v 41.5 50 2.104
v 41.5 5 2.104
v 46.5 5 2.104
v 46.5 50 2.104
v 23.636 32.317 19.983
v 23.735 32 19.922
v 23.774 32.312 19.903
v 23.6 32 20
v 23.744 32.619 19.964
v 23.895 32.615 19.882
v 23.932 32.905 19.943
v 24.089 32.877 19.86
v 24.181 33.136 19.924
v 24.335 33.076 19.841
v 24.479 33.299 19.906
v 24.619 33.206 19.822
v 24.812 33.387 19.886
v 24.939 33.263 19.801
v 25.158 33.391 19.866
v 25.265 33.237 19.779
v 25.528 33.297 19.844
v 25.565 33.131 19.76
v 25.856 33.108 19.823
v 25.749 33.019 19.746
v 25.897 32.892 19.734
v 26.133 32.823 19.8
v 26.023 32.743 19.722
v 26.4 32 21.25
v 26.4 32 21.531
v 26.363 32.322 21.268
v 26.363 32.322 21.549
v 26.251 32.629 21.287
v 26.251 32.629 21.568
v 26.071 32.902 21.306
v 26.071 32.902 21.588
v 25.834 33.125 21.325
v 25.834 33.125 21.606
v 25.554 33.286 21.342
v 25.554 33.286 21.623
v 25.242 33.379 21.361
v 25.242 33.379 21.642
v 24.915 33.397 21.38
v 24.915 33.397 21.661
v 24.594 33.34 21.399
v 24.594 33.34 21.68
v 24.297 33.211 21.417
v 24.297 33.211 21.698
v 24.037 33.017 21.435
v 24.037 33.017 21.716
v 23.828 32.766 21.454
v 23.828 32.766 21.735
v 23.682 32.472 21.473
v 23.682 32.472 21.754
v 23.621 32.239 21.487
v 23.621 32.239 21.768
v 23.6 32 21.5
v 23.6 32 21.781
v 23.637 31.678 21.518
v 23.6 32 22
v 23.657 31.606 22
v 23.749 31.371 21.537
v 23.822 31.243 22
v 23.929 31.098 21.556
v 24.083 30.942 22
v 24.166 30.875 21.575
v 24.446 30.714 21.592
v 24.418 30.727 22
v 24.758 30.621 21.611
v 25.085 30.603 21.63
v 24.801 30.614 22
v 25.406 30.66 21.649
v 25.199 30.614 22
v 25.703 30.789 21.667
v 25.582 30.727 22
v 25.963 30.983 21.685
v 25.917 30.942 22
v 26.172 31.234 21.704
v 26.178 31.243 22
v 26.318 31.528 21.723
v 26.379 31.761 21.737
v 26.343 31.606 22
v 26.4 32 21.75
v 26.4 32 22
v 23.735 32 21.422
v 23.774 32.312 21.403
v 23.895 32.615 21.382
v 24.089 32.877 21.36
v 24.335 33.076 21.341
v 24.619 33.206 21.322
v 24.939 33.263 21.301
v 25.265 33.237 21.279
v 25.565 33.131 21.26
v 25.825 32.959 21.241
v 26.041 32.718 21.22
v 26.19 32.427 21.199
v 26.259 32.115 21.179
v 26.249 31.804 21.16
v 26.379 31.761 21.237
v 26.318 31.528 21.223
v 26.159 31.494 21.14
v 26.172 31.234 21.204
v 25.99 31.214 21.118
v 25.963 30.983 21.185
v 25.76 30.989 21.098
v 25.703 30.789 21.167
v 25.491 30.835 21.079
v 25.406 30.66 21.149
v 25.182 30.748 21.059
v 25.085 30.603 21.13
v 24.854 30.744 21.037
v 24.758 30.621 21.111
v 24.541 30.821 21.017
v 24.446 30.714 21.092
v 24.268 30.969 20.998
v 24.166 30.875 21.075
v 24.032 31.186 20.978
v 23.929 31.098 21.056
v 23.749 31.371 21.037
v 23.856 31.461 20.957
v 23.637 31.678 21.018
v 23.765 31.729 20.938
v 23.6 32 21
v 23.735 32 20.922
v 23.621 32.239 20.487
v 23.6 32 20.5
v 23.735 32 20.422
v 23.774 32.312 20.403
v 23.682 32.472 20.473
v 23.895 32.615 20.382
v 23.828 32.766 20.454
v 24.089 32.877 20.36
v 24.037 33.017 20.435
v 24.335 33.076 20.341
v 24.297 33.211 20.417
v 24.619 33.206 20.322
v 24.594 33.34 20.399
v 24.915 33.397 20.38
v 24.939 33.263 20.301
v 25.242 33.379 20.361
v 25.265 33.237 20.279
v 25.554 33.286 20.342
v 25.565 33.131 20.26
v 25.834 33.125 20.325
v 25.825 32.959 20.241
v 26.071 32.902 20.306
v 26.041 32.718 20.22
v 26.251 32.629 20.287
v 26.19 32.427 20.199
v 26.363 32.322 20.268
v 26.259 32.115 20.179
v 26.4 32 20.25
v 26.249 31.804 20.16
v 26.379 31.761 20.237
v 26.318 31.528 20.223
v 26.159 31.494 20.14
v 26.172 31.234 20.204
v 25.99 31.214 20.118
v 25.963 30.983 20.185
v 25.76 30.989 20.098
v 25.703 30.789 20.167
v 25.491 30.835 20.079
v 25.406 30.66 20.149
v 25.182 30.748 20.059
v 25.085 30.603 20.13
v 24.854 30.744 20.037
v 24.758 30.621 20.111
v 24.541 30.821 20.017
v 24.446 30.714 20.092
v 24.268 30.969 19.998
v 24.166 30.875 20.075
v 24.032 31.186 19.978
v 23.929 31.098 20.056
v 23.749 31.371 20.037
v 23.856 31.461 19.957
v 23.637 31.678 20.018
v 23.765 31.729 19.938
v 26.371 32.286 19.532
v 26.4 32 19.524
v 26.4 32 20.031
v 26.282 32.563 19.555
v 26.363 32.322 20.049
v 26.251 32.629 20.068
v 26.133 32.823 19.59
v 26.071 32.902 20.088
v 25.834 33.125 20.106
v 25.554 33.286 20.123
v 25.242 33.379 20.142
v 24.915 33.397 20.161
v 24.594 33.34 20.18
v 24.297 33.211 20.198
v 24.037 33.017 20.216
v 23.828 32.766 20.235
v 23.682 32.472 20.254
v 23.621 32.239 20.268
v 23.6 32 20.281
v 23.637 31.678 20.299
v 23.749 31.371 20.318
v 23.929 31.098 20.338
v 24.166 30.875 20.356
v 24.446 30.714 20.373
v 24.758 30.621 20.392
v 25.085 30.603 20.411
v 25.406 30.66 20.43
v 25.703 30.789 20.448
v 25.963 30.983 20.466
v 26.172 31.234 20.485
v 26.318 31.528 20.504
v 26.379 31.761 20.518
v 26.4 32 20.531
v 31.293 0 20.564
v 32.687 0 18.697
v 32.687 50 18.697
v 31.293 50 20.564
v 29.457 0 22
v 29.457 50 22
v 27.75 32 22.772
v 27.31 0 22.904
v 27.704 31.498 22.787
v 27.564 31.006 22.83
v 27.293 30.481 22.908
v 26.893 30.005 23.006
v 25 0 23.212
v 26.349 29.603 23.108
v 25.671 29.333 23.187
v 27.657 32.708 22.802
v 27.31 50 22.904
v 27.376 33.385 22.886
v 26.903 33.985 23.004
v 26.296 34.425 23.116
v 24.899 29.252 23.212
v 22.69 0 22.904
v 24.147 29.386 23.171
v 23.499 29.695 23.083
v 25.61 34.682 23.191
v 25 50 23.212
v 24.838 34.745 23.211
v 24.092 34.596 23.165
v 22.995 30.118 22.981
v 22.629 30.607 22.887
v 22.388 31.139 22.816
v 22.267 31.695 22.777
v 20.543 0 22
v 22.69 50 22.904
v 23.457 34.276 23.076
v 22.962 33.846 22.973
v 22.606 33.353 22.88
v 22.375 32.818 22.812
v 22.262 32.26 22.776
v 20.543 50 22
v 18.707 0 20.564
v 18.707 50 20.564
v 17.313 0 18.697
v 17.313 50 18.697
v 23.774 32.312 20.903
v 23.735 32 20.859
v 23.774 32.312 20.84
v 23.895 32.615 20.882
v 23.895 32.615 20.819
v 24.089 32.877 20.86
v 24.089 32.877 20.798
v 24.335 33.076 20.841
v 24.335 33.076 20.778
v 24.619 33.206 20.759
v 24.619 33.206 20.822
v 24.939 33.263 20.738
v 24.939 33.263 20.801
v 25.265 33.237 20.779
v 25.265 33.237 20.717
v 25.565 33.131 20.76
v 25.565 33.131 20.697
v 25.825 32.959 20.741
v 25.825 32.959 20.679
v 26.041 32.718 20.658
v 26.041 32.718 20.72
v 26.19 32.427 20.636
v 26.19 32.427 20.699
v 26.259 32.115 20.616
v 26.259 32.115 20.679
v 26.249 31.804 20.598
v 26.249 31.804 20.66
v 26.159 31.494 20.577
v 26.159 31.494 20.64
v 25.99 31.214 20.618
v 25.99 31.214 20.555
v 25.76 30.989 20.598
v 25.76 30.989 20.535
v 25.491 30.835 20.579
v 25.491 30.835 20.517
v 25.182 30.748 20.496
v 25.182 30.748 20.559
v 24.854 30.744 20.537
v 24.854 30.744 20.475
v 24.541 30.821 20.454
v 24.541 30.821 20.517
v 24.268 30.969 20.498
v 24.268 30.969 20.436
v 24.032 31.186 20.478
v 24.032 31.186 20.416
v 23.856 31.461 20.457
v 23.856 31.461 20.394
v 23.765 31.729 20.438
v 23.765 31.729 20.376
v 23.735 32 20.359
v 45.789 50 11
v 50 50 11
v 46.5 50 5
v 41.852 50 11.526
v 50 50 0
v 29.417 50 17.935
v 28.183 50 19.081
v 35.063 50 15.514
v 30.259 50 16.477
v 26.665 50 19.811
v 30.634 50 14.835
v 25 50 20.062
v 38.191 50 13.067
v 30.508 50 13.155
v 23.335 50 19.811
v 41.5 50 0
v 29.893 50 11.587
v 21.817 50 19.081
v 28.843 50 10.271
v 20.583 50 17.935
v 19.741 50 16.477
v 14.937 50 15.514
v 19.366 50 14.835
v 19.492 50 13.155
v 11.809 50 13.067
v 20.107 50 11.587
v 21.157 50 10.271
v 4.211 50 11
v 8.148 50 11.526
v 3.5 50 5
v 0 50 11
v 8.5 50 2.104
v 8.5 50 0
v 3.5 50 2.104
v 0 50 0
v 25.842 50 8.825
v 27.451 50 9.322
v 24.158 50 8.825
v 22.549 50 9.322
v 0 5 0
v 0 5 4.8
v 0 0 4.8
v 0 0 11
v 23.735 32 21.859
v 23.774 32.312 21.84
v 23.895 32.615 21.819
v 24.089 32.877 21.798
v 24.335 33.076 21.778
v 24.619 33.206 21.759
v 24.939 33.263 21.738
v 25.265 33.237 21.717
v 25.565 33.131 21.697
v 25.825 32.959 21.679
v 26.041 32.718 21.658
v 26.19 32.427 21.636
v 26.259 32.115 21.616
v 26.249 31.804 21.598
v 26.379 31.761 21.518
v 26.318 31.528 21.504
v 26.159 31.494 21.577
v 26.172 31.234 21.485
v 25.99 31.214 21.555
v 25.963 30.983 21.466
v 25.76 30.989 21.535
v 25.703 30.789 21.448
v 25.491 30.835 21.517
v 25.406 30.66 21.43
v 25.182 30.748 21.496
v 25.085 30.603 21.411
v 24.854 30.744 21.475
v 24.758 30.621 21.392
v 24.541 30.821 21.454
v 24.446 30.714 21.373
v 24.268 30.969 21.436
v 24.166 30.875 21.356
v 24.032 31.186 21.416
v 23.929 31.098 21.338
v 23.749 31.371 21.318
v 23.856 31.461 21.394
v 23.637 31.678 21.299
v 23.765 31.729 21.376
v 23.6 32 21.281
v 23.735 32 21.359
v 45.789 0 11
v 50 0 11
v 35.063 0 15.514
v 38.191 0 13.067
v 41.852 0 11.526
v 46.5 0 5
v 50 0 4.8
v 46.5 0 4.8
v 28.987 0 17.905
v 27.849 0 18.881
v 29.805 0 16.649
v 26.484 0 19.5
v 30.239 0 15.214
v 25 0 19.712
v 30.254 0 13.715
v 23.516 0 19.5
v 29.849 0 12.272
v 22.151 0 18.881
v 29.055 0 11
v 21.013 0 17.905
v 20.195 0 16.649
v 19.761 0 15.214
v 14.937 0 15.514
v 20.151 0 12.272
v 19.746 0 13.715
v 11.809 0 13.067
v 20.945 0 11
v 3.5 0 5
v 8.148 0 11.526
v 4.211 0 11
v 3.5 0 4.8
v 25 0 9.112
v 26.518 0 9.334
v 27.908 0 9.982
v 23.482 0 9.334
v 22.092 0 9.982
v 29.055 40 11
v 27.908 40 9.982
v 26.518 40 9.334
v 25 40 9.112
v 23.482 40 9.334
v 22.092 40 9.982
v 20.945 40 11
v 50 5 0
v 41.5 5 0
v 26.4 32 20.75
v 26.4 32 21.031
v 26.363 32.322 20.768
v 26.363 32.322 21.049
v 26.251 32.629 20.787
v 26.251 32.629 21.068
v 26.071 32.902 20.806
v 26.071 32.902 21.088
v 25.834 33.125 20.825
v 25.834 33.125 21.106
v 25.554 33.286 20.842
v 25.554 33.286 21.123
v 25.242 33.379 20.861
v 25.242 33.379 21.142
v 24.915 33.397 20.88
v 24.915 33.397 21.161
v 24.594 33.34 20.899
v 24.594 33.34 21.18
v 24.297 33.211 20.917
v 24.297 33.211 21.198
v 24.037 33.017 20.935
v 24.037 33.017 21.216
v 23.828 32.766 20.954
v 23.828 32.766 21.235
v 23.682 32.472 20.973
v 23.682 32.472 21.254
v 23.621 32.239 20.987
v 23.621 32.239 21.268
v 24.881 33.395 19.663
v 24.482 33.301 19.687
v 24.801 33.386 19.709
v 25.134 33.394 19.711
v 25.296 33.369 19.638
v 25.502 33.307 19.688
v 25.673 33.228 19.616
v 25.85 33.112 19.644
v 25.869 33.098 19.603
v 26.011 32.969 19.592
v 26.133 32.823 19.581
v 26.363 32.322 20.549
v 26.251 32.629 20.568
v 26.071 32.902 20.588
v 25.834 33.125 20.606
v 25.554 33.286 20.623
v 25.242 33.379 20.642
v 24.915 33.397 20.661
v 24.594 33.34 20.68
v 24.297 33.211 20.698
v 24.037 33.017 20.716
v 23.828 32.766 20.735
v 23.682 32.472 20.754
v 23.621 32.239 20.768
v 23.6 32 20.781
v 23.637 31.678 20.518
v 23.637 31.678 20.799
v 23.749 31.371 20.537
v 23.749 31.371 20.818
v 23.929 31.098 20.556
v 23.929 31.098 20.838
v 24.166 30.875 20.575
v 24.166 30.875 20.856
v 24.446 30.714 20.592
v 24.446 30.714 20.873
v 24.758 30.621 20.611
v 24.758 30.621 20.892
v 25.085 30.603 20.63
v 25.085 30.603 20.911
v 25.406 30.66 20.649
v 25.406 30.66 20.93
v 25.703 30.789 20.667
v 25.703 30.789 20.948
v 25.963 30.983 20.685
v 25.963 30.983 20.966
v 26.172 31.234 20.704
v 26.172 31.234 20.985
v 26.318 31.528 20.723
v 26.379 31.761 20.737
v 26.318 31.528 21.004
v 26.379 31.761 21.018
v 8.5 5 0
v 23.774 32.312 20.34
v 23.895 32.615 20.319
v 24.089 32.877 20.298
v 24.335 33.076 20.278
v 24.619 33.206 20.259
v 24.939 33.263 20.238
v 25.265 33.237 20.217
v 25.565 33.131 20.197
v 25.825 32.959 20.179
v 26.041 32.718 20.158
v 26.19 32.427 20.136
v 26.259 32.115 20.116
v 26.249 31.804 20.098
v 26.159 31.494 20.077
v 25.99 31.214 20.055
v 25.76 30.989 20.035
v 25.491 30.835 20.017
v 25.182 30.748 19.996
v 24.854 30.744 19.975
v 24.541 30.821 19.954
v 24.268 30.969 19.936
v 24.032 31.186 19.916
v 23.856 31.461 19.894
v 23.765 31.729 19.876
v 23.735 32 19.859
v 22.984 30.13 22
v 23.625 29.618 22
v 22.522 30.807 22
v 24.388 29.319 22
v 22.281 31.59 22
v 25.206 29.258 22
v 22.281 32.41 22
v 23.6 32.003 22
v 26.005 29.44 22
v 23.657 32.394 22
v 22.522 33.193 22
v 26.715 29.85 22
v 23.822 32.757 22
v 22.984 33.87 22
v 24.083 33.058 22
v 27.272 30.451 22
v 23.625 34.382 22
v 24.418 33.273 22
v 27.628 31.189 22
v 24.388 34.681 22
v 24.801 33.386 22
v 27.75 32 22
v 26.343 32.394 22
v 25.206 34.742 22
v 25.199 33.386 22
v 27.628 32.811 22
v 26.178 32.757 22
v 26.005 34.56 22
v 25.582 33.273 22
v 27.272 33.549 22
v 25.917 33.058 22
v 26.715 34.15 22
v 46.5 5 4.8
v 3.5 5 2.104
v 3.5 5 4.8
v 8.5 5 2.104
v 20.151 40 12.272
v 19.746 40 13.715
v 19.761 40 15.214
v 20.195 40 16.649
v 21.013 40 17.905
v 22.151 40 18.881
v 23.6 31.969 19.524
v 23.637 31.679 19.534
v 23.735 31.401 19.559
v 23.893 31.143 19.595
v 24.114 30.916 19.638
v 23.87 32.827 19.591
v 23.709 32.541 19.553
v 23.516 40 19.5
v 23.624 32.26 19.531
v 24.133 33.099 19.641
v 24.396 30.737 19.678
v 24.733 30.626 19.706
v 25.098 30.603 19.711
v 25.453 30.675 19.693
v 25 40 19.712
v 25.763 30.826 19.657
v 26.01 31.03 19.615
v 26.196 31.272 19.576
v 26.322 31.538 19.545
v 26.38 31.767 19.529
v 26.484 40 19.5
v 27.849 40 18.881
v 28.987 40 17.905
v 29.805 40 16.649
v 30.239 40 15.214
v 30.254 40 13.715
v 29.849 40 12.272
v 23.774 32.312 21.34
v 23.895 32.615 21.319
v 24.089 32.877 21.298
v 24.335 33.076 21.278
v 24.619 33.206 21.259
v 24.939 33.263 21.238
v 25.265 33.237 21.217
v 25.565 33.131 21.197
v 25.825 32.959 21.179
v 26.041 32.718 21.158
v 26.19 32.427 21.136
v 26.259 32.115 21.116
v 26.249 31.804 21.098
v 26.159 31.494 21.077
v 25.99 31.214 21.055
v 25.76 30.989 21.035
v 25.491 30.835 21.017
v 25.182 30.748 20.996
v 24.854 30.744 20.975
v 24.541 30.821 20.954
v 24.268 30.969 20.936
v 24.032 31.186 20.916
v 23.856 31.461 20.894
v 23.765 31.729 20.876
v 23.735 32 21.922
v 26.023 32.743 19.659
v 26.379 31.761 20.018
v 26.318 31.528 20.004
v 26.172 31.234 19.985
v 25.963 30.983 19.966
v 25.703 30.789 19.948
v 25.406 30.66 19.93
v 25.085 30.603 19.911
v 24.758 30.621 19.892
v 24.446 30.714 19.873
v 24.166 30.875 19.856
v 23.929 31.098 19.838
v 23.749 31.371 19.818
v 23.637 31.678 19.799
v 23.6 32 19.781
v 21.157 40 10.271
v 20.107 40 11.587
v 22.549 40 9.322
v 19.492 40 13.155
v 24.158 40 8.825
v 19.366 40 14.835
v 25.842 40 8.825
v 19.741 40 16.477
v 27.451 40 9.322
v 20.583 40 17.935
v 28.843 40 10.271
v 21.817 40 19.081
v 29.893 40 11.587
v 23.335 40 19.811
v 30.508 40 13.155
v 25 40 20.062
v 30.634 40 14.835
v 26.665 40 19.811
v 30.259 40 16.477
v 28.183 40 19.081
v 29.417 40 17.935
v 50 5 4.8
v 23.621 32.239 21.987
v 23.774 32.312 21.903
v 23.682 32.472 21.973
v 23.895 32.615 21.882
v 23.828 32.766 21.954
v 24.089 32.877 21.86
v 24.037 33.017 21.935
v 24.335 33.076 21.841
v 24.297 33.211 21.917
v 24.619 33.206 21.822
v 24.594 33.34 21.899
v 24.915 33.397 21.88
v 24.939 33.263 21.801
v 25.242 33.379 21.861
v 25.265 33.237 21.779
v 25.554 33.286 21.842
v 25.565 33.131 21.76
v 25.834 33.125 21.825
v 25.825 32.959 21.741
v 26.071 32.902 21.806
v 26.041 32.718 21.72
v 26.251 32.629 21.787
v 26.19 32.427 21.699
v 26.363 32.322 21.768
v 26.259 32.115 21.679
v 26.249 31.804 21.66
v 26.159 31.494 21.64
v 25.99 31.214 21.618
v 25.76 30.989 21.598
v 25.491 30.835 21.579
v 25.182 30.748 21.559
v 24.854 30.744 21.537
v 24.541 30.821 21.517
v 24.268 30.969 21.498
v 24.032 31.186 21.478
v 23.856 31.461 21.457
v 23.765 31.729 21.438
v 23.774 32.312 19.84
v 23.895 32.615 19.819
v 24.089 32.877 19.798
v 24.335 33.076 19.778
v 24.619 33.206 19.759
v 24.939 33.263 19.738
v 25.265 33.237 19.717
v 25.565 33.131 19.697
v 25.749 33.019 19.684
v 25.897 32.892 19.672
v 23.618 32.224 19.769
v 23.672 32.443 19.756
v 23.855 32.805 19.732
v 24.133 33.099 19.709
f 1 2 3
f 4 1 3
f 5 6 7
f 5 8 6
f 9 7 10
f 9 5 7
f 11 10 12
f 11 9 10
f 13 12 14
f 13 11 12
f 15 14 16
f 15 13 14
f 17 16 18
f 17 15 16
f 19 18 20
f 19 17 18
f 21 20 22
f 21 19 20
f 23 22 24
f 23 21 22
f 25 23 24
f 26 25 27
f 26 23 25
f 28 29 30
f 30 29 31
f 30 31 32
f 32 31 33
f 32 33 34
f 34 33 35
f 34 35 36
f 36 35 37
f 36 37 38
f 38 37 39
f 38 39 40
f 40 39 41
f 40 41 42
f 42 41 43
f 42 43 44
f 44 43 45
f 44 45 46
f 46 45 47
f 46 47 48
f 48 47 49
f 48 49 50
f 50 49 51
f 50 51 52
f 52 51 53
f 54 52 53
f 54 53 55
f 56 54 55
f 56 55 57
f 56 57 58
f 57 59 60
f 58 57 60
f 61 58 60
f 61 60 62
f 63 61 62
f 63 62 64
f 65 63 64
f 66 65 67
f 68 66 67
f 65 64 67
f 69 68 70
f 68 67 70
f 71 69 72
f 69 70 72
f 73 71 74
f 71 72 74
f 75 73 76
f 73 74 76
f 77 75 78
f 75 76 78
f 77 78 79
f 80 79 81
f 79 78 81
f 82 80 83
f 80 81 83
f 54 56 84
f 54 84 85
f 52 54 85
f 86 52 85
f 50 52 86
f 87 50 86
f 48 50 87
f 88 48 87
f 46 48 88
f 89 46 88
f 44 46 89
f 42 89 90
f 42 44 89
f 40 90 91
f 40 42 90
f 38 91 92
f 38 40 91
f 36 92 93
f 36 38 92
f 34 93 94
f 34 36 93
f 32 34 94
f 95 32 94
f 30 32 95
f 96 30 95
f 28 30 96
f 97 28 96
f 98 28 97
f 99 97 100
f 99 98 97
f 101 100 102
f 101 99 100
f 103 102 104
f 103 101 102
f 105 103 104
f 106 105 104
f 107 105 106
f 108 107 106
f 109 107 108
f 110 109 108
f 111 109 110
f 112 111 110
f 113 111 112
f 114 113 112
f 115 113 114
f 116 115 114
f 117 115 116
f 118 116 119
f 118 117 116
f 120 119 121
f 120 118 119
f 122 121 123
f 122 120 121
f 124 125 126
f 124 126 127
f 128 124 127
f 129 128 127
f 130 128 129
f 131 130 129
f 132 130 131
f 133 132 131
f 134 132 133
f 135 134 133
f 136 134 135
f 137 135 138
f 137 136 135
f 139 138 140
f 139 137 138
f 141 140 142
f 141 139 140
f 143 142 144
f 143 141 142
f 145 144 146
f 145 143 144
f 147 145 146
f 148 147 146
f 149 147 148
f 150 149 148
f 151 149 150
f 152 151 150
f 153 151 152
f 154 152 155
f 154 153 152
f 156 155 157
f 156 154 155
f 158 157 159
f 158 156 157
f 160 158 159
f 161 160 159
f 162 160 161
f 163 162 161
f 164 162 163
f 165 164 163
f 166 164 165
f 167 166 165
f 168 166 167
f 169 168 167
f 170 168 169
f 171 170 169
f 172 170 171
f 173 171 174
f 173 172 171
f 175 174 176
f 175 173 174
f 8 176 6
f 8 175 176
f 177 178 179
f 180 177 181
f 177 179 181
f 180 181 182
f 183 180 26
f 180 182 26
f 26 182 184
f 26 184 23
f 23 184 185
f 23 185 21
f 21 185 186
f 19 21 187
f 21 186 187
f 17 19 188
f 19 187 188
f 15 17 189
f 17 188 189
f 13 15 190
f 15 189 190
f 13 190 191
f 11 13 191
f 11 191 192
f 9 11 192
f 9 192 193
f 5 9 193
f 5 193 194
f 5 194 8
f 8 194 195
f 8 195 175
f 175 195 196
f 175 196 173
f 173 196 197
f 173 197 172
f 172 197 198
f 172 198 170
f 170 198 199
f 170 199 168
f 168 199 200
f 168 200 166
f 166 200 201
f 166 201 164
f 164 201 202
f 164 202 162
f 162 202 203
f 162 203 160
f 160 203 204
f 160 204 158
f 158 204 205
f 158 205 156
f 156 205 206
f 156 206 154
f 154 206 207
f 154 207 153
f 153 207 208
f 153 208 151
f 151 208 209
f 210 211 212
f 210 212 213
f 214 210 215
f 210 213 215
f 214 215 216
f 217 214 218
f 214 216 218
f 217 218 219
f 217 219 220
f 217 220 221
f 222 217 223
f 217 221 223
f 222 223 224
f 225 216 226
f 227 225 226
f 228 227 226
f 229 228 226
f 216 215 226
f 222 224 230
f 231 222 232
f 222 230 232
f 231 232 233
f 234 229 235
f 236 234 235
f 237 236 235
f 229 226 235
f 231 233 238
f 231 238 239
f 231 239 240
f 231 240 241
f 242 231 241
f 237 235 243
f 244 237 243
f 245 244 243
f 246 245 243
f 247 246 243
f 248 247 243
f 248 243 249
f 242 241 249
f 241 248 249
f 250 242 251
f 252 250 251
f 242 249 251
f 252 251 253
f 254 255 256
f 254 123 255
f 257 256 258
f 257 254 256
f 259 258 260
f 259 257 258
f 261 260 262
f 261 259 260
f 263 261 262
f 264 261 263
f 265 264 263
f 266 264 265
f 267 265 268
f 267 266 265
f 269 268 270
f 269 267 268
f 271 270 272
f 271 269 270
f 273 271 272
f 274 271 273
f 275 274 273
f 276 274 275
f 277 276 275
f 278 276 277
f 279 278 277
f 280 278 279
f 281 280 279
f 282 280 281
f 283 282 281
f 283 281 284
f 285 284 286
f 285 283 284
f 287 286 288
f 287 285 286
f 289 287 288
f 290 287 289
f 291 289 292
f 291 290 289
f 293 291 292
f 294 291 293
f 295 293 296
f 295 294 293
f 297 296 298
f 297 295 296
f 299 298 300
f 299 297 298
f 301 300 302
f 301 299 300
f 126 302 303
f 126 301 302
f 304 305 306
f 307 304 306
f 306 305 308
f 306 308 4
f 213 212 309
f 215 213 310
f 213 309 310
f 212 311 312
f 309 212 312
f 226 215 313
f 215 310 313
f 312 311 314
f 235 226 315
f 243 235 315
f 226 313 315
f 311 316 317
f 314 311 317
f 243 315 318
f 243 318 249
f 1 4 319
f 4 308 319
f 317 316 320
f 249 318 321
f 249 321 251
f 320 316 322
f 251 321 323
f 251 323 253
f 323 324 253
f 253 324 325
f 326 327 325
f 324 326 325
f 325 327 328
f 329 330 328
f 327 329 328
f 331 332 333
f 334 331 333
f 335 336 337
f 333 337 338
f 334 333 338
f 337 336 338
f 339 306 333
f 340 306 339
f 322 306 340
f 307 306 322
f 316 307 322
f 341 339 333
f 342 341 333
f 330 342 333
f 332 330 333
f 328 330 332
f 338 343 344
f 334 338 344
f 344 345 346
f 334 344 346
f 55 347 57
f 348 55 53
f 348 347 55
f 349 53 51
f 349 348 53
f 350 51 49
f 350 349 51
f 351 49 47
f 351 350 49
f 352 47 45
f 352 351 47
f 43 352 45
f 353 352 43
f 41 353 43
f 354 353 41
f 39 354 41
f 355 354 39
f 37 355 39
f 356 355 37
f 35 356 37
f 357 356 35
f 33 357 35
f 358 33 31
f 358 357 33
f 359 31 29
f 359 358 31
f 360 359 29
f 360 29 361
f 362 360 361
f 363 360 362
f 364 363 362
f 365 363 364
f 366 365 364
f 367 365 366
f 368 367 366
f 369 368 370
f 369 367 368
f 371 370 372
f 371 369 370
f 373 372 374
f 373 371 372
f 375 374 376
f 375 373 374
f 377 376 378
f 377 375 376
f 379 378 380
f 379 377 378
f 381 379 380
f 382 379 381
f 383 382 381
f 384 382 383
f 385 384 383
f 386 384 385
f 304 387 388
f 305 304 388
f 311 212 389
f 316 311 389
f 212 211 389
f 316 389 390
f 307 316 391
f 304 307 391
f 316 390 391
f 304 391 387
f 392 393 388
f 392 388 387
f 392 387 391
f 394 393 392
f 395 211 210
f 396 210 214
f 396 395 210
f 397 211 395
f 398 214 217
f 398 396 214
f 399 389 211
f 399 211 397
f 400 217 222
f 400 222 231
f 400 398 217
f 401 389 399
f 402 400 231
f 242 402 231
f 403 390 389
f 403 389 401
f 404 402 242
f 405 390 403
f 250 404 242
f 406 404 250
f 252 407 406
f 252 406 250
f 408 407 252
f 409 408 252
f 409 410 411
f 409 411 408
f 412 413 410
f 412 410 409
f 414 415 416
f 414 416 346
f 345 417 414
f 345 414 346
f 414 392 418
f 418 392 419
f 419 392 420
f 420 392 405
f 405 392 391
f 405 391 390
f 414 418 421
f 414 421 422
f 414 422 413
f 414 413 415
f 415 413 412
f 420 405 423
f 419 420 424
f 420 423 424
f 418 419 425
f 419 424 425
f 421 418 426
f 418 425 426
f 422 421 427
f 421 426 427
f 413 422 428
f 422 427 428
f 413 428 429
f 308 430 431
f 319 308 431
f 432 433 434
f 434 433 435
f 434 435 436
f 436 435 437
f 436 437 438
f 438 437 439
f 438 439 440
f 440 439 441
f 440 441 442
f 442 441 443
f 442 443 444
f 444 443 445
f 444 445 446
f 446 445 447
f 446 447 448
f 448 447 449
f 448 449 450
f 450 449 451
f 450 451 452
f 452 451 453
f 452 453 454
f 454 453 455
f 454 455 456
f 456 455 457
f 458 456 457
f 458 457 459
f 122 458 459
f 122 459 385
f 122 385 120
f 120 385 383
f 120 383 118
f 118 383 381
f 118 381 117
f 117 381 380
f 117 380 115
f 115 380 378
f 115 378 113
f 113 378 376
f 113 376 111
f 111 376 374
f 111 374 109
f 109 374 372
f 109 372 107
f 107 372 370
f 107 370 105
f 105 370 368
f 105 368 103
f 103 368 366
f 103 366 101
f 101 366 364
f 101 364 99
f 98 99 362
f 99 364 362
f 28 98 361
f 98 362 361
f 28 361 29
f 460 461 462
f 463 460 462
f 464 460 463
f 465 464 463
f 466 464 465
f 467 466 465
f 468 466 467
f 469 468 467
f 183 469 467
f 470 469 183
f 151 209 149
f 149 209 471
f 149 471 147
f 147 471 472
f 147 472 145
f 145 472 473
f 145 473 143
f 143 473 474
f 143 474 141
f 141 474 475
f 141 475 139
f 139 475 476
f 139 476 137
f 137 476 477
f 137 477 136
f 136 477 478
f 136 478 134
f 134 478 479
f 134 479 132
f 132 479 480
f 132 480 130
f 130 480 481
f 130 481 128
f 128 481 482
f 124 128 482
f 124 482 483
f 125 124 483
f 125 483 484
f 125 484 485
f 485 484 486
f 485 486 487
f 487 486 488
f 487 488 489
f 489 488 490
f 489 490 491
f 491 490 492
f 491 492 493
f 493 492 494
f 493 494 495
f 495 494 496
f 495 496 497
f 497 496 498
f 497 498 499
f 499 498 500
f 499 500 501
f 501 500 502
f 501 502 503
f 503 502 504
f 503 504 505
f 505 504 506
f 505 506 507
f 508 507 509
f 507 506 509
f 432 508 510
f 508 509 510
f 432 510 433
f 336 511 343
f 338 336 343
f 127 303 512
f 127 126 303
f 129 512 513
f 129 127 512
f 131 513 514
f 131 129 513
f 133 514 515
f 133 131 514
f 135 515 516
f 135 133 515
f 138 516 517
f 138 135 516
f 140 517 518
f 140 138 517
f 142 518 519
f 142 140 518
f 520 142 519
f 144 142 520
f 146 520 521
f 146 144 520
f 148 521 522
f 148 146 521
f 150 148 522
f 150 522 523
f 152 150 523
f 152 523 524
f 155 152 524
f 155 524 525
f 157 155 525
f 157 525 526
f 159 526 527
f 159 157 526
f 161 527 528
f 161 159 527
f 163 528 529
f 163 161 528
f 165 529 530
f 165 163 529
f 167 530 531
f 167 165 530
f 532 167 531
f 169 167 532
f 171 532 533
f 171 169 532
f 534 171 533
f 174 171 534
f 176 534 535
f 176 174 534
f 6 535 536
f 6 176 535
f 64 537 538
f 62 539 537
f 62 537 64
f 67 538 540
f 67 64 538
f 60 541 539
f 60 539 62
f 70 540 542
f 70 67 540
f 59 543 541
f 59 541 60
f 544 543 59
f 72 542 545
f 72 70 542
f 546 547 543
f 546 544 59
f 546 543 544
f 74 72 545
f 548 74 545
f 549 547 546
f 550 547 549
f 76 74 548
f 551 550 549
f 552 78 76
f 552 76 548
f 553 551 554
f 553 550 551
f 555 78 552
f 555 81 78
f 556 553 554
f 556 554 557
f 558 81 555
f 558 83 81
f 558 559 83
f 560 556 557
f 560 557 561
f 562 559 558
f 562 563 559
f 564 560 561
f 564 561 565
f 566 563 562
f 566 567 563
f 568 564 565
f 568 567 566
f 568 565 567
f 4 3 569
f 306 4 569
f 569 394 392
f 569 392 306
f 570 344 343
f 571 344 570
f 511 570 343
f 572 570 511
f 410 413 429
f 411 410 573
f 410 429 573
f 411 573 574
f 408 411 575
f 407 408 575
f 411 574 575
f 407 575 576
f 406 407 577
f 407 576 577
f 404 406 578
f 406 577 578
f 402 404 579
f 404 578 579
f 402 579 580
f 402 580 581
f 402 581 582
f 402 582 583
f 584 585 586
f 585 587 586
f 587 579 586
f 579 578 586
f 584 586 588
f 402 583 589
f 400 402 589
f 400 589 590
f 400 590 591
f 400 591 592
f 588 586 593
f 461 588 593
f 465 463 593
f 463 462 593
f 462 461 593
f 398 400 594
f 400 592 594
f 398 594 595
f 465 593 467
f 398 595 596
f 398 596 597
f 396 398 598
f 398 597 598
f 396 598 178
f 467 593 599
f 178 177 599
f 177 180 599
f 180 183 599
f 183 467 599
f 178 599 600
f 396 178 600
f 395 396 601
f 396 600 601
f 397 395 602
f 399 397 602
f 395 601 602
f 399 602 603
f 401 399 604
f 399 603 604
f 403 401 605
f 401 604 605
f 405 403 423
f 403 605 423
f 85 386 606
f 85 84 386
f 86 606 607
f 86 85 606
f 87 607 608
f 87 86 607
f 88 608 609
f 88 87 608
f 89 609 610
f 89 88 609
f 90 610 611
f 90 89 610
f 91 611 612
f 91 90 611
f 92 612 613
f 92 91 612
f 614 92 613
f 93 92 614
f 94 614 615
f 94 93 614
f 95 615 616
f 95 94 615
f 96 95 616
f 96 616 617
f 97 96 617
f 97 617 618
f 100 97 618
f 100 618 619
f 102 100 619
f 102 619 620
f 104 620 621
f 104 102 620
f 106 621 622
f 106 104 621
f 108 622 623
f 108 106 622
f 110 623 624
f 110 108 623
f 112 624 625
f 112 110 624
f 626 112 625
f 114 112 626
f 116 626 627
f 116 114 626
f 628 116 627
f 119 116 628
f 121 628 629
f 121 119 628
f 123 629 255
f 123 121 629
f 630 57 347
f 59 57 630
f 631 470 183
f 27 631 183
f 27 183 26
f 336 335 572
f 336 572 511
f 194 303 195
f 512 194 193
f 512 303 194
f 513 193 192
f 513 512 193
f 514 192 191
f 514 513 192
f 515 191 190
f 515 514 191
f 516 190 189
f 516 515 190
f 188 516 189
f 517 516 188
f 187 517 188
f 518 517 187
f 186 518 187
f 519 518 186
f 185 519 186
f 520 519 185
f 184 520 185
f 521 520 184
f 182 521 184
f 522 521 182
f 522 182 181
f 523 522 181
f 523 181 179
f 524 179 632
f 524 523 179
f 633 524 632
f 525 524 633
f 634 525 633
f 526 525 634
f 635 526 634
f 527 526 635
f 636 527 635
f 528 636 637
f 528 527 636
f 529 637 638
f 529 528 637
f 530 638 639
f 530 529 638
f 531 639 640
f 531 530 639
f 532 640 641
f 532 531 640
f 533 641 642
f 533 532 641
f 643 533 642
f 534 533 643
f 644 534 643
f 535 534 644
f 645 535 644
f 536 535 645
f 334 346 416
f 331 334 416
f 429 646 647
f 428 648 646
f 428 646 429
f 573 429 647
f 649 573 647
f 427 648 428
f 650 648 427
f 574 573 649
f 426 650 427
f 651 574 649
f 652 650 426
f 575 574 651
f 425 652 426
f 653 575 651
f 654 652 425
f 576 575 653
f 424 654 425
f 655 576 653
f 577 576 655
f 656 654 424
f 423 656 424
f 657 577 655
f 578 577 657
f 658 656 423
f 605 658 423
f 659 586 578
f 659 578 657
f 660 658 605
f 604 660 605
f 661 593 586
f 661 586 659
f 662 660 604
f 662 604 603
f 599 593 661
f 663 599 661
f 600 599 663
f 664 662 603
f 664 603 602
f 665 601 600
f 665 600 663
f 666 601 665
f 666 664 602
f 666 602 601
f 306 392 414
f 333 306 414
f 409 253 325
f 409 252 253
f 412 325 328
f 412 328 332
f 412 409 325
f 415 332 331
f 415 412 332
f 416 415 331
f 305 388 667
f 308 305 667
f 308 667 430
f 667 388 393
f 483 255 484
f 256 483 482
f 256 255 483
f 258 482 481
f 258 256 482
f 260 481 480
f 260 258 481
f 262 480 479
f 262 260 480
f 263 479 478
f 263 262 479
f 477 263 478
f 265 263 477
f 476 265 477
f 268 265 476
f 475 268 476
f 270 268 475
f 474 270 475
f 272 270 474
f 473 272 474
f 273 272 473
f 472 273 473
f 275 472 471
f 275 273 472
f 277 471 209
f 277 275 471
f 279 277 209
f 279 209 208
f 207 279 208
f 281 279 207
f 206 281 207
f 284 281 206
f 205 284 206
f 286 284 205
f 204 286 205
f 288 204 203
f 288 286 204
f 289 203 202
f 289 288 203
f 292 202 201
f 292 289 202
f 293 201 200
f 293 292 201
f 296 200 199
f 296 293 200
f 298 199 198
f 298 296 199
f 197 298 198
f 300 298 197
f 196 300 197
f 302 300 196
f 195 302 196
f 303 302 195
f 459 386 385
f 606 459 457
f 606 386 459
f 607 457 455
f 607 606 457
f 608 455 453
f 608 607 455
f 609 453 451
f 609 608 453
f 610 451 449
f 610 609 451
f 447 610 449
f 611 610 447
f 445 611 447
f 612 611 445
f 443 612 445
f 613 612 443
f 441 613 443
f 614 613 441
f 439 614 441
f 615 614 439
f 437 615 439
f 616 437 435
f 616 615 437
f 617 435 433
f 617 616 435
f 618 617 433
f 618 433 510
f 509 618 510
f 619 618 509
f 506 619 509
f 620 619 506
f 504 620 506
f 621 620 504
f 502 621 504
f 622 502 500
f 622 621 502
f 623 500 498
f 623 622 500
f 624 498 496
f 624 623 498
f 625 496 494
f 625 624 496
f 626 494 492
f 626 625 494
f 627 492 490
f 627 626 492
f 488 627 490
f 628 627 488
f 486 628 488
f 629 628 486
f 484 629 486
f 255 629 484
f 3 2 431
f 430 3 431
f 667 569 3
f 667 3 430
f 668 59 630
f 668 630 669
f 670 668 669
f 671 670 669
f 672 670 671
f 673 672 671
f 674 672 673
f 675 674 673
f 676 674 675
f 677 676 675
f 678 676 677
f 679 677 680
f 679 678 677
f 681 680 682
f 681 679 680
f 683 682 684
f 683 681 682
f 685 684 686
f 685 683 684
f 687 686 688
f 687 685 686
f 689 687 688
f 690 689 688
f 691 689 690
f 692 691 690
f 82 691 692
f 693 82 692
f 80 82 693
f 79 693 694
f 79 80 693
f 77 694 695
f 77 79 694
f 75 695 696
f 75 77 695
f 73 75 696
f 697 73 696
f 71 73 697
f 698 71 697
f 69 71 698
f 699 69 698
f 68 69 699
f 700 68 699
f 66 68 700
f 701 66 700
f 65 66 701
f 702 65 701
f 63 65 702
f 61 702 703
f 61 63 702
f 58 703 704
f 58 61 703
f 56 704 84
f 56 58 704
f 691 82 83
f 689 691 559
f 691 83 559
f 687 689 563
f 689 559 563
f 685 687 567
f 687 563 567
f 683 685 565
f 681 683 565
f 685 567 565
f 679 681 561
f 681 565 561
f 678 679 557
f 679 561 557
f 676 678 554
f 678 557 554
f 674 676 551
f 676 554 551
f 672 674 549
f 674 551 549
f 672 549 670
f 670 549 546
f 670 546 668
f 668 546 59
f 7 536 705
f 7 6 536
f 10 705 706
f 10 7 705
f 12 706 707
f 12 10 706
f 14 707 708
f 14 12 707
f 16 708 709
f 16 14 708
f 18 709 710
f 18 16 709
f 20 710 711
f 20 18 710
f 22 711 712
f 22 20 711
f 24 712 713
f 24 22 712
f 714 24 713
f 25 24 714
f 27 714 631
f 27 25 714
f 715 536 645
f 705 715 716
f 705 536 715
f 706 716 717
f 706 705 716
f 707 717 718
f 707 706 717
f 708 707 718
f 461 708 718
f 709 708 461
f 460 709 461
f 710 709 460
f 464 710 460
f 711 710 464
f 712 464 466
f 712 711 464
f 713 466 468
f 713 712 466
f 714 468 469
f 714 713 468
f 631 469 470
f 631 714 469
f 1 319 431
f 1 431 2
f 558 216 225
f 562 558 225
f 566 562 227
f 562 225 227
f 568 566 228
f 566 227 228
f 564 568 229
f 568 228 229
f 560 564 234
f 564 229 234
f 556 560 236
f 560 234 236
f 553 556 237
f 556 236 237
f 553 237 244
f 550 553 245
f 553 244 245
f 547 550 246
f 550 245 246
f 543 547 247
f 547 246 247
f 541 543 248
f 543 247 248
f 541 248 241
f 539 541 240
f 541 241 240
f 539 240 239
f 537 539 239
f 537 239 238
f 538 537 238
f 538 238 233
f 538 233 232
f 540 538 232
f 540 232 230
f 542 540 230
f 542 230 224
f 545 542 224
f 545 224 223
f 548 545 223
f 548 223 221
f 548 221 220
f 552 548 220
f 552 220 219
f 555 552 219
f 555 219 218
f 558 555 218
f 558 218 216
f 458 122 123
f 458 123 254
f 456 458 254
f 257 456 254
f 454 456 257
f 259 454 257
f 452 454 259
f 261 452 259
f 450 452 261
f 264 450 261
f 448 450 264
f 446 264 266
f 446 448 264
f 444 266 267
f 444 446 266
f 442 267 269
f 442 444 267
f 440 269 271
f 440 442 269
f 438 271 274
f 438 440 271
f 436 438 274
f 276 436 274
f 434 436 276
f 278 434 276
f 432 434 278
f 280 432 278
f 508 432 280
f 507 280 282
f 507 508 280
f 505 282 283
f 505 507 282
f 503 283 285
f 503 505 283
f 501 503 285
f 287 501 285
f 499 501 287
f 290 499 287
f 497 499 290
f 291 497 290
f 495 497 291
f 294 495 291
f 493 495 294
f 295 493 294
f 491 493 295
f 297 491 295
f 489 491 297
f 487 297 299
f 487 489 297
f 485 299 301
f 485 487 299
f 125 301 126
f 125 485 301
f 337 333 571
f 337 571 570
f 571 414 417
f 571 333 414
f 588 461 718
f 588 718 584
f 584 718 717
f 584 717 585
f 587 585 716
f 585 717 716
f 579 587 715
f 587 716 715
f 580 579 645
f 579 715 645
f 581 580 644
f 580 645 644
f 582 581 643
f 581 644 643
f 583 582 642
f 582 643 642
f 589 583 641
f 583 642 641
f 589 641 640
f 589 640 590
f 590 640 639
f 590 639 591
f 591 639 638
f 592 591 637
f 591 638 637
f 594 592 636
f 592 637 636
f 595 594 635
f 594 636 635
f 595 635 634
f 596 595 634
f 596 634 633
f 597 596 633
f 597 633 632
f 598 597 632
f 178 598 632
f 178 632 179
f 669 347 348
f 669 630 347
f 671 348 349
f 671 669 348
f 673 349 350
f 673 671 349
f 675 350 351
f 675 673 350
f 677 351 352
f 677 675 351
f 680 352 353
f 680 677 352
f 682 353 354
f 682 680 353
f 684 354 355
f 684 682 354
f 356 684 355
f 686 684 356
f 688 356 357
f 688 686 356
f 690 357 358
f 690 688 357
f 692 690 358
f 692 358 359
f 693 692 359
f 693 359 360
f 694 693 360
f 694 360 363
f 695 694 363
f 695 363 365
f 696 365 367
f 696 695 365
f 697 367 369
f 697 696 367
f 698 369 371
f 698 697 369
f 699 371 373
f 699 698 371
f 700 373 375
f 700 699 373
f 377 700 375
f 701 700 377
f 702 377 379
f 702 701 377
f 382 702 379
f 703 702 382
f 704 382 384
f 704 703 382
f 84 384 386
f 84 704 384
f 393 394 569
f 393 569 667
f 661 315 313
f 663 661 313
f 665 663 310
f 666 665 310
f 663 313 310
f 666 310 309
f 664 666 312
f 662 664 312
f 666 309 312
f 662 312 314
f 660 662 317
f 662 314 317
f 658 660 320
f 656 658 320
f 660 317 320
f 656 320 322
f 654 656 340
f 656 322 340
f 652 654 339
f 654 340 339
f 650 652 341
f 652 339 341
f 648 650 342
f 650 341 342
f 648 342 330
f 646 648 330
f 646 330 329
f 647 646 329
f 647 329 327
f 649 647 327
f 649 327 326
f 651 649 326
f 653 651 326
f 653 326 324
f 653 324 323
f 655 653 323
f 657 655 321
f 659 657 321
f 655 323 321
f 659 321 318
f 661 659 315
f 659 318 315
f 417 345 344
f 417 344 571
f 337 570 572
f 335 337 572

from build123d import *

# Parameters (mm, degrees)
BOSS_EXTRUDE1_DEPTH = 50
SKETCH2_W           = 50
SKETCH2_H           = 4.8
CUT_EXTRUDE1_DEPTH  = 5
SKETCH3_R           = 5.3
CUT_EXTRUDE2_DEPTH  = 72.561162651
BOSS_EXTRUDE2_DEPTH = 50
FILLET1_R           = 15
SKETCH6_R           = 1.4
CUT_EXTRUDE4_DEPTH  = 10
SKETCH7_R           = 2.75
CUT_EXTRUDE5_DEPTH  = 5
THREAD1_PITCH       = 0.5
SKETCH9_R           = 5.65
CUT_EXTRUDE6_DEPTH  = 10


with BuildPart() as part:
    # Sketch1 → Boss-Extrude1 (new body)
    with BuildSketch(Plane(origin=(0, 0, 0), x_dir=(1, 0, 0), z_dir=(0, 1, 0))):
        Polygon((8.5, 0), (0, 0), (0, -11), (50, -11), (50, 0), (41.5, 0), (41.5, -2.104480912), (46.5, -2.104480912), (46.5, -5), (3.5, -5), (3.5, -2.104480912), (8.5, -2.104480912), align=None)
    extrude(amount=BOSS_EXTRUDE1_DEPTH)

    # Sketch2 → Cut-Extrude1 (cut)
    with BuildSketch(Plane.XZ):
        with Locations((25, 2.4)):
            Rectangle(SKETCH2_W, SKETCH2_H)
    extrude(amount=-CUT_EXTRUDE1_DEPTH, mode=Mode.SUBTRACT)

    # Sketch3 → Cut-Extrude2 (cut, through all)
    with BuildSketch(Plane(origin=(0, 50, 0), x_dir=(1, 0, 0), z_dir=(0, 1, 0))):
        with Locations((25, -14.412334908)):
            Circle(SKETCH3_R)
    extrude(amount=-CUT_EXTRUDE2_DEPTH, mode=Mode.SUBTRACT)

    # Sketch5 → Boss-Extrude2 (add)
    with BuildSketch(Plane(origin=(0, 50, 0), x_dir=(1, 0, 0), z_dir=(0, 1, 0))):
        with BuildLine():
            Line((16.888528464, -11), (20.944636826, -11))
            ThreePointArc((20.944636826, -11), (25, -19.712334908), (29.055363174, -11))
            Line((29.055363174, -11), (33.111471536, -11))
            ThreePointArc((33.111471536, -11), (25, -23.212334908), (16.888528464, -11))
        make_face()
    extrude(amount=-BOSS_EXTRUDE2_DEPTH)

    # Fillet1
    fillet1_edges = [part.edges().sort_by_distance(p)[0] for p in [
        (33.111471536, 25, 11),
        (16.888528464, 25, 11),
    ]]
    fillet(fillet1_edges, radius=FILLET1_R)

    # Sketch6 → Cut-Extrude4 (cut)
    with BuildSketch(Plane.XY.offset(27)):
        with Locations((25, 32)):
            Circle(SKETCH6_R)
    extrude(amount=-CUT_EXTRUDE4_DEPTH, mode=Mode.SUBTRACT)

    # Sketch7 → Cut-Extrude5 (cut)
    with BuildSketch(Plane.XY.offset(27)):
        with Locations((25, 32)):
            Circle(SKETCH7_R)
    extrude(amount=-CUT_EXTRUDE5_DEPTH, mode=Mode.SUBTRACT)

    # Thread1: the profile of Thread Profile1 profile screwed along a right-hand helix of 4.4 turns, 6 arcs to a turn; built about Z, then put on its axis
    thread1_z = Axis((0, 0, 0), (0, 0, 1))
    thread1_corners = [(1.4003, 0, -0.000173205), (1.4003, 0, 0.218923204), (1.264683531, 0, 0.140625), (1.264683531, 0, 0.078125)]
    with BuildLine(mode=Mode.PRIVATE) as thread1_profile:
        Line(thread1_corners[0], thread1_corners[1])
        Line(thread1_corners[1], thread1_corners[2])
        Line(thread1_corners[2], thread1_corners[3])
        Line(thread1_corners[3], thread1_corners[0])
    thread1_cap = Face(thread1_profile.wire())
    thread1_turn_angles = [0, 30, 60, 90, 120, 150, 180, 210, 240, 270, 300, 330, 360]
    thread1_turn_weights = [1, 0.8660254037844387, 1, 0.8660254037844387, 1, 0.8660254037844387, 1, 0.8660254037844387, 1, 0.8660254037844387, 1, 0.8660254037844387, 1]
    thread1_turn_rails = [Edge.make_bspline([Vector(p[0], p[1], 0).rotate(thread1_z, thread1_turn_angles[k]) / thread1_turn_weights[k] + Vector(0, 0, p[2] + THREAD1_PITCH * thread1_turn_angles[k] / 360) for k in range(13)], [0, 0, 0, 1, 1, 2, 2, 3, 3, 4, 4, 5, 5, 6, 6, 6], 2, thread1_turn_weights) for p in thread1_corners]
    thread1_turn_sides = [Face.make_surface_from_curves(thread1_turn_rails[p[0]], thread1_turn_rails[p[1]]) for p in [(0, 1), (1, 2), (2, 3), (3, 0)]]
    thread1_last_angles = [1440, 1470, 1500, 1530, 1560, 1572, 1584]
    thread1_last_weights = [1, 0.8660254037844387, 1, 0.8660254037844387, 1, 0.9781476007338052, 1]
    thread1_last_rails = [Edge.make_bspline([Vector(p[0], p[1], 0).rotate(thread1_z, thread1_last_angles[k]) / thread1_last_weights[k] + Vector(0, 0, p[2] + THREAD1_PITCH * thread1_last_angles[k] / 360) for k in range(7)], [0, 0, 0, 1, 1, 2, 2, 3, 3, 3], 2, thread1_last_weights) for p in thread1_corners]
    thread1_last_sides = [Face.make_surface_from_curves(thread1_last_rails[p[0]], thread1_last_rails[p[1]]) for p in [(0, 1), (1, 2), (2, 3), (3, 0)]]
    thread1 = Plane(origin=(25, 32, 22), x_dir=(-1, 0, 0), z_dir=(0, 0, -1)) * Solid(Shell([*[p.moved(Location((0, 0, THREAD1_PITCH * i))) for i in range(4) for p in thread1_turn_sides], *thread1_last_sides, thread1_cap, thread1_cap.rotate(thread1_z, 1584).moved(Location((0, 0, THREAD1_PITCH * 1584 / 360)))]))
    add(thread1)

    # Sketch9 → Cut-Extrude6 (cut)
    with BuildSketch(Plane(origin=(0, 50, 0), x_dir=(1, 0, 0), z_dir=(0, 1, 0))):
        with Locations(Location((25, -14.412334908, 0), (0, 0, 270))):
            Circle(SKETCH9_R)
    extrude(amount=-CUT_EXTRUDE6_DEPTH, mode=Mode.SUBTRACT)


solid = part.part
